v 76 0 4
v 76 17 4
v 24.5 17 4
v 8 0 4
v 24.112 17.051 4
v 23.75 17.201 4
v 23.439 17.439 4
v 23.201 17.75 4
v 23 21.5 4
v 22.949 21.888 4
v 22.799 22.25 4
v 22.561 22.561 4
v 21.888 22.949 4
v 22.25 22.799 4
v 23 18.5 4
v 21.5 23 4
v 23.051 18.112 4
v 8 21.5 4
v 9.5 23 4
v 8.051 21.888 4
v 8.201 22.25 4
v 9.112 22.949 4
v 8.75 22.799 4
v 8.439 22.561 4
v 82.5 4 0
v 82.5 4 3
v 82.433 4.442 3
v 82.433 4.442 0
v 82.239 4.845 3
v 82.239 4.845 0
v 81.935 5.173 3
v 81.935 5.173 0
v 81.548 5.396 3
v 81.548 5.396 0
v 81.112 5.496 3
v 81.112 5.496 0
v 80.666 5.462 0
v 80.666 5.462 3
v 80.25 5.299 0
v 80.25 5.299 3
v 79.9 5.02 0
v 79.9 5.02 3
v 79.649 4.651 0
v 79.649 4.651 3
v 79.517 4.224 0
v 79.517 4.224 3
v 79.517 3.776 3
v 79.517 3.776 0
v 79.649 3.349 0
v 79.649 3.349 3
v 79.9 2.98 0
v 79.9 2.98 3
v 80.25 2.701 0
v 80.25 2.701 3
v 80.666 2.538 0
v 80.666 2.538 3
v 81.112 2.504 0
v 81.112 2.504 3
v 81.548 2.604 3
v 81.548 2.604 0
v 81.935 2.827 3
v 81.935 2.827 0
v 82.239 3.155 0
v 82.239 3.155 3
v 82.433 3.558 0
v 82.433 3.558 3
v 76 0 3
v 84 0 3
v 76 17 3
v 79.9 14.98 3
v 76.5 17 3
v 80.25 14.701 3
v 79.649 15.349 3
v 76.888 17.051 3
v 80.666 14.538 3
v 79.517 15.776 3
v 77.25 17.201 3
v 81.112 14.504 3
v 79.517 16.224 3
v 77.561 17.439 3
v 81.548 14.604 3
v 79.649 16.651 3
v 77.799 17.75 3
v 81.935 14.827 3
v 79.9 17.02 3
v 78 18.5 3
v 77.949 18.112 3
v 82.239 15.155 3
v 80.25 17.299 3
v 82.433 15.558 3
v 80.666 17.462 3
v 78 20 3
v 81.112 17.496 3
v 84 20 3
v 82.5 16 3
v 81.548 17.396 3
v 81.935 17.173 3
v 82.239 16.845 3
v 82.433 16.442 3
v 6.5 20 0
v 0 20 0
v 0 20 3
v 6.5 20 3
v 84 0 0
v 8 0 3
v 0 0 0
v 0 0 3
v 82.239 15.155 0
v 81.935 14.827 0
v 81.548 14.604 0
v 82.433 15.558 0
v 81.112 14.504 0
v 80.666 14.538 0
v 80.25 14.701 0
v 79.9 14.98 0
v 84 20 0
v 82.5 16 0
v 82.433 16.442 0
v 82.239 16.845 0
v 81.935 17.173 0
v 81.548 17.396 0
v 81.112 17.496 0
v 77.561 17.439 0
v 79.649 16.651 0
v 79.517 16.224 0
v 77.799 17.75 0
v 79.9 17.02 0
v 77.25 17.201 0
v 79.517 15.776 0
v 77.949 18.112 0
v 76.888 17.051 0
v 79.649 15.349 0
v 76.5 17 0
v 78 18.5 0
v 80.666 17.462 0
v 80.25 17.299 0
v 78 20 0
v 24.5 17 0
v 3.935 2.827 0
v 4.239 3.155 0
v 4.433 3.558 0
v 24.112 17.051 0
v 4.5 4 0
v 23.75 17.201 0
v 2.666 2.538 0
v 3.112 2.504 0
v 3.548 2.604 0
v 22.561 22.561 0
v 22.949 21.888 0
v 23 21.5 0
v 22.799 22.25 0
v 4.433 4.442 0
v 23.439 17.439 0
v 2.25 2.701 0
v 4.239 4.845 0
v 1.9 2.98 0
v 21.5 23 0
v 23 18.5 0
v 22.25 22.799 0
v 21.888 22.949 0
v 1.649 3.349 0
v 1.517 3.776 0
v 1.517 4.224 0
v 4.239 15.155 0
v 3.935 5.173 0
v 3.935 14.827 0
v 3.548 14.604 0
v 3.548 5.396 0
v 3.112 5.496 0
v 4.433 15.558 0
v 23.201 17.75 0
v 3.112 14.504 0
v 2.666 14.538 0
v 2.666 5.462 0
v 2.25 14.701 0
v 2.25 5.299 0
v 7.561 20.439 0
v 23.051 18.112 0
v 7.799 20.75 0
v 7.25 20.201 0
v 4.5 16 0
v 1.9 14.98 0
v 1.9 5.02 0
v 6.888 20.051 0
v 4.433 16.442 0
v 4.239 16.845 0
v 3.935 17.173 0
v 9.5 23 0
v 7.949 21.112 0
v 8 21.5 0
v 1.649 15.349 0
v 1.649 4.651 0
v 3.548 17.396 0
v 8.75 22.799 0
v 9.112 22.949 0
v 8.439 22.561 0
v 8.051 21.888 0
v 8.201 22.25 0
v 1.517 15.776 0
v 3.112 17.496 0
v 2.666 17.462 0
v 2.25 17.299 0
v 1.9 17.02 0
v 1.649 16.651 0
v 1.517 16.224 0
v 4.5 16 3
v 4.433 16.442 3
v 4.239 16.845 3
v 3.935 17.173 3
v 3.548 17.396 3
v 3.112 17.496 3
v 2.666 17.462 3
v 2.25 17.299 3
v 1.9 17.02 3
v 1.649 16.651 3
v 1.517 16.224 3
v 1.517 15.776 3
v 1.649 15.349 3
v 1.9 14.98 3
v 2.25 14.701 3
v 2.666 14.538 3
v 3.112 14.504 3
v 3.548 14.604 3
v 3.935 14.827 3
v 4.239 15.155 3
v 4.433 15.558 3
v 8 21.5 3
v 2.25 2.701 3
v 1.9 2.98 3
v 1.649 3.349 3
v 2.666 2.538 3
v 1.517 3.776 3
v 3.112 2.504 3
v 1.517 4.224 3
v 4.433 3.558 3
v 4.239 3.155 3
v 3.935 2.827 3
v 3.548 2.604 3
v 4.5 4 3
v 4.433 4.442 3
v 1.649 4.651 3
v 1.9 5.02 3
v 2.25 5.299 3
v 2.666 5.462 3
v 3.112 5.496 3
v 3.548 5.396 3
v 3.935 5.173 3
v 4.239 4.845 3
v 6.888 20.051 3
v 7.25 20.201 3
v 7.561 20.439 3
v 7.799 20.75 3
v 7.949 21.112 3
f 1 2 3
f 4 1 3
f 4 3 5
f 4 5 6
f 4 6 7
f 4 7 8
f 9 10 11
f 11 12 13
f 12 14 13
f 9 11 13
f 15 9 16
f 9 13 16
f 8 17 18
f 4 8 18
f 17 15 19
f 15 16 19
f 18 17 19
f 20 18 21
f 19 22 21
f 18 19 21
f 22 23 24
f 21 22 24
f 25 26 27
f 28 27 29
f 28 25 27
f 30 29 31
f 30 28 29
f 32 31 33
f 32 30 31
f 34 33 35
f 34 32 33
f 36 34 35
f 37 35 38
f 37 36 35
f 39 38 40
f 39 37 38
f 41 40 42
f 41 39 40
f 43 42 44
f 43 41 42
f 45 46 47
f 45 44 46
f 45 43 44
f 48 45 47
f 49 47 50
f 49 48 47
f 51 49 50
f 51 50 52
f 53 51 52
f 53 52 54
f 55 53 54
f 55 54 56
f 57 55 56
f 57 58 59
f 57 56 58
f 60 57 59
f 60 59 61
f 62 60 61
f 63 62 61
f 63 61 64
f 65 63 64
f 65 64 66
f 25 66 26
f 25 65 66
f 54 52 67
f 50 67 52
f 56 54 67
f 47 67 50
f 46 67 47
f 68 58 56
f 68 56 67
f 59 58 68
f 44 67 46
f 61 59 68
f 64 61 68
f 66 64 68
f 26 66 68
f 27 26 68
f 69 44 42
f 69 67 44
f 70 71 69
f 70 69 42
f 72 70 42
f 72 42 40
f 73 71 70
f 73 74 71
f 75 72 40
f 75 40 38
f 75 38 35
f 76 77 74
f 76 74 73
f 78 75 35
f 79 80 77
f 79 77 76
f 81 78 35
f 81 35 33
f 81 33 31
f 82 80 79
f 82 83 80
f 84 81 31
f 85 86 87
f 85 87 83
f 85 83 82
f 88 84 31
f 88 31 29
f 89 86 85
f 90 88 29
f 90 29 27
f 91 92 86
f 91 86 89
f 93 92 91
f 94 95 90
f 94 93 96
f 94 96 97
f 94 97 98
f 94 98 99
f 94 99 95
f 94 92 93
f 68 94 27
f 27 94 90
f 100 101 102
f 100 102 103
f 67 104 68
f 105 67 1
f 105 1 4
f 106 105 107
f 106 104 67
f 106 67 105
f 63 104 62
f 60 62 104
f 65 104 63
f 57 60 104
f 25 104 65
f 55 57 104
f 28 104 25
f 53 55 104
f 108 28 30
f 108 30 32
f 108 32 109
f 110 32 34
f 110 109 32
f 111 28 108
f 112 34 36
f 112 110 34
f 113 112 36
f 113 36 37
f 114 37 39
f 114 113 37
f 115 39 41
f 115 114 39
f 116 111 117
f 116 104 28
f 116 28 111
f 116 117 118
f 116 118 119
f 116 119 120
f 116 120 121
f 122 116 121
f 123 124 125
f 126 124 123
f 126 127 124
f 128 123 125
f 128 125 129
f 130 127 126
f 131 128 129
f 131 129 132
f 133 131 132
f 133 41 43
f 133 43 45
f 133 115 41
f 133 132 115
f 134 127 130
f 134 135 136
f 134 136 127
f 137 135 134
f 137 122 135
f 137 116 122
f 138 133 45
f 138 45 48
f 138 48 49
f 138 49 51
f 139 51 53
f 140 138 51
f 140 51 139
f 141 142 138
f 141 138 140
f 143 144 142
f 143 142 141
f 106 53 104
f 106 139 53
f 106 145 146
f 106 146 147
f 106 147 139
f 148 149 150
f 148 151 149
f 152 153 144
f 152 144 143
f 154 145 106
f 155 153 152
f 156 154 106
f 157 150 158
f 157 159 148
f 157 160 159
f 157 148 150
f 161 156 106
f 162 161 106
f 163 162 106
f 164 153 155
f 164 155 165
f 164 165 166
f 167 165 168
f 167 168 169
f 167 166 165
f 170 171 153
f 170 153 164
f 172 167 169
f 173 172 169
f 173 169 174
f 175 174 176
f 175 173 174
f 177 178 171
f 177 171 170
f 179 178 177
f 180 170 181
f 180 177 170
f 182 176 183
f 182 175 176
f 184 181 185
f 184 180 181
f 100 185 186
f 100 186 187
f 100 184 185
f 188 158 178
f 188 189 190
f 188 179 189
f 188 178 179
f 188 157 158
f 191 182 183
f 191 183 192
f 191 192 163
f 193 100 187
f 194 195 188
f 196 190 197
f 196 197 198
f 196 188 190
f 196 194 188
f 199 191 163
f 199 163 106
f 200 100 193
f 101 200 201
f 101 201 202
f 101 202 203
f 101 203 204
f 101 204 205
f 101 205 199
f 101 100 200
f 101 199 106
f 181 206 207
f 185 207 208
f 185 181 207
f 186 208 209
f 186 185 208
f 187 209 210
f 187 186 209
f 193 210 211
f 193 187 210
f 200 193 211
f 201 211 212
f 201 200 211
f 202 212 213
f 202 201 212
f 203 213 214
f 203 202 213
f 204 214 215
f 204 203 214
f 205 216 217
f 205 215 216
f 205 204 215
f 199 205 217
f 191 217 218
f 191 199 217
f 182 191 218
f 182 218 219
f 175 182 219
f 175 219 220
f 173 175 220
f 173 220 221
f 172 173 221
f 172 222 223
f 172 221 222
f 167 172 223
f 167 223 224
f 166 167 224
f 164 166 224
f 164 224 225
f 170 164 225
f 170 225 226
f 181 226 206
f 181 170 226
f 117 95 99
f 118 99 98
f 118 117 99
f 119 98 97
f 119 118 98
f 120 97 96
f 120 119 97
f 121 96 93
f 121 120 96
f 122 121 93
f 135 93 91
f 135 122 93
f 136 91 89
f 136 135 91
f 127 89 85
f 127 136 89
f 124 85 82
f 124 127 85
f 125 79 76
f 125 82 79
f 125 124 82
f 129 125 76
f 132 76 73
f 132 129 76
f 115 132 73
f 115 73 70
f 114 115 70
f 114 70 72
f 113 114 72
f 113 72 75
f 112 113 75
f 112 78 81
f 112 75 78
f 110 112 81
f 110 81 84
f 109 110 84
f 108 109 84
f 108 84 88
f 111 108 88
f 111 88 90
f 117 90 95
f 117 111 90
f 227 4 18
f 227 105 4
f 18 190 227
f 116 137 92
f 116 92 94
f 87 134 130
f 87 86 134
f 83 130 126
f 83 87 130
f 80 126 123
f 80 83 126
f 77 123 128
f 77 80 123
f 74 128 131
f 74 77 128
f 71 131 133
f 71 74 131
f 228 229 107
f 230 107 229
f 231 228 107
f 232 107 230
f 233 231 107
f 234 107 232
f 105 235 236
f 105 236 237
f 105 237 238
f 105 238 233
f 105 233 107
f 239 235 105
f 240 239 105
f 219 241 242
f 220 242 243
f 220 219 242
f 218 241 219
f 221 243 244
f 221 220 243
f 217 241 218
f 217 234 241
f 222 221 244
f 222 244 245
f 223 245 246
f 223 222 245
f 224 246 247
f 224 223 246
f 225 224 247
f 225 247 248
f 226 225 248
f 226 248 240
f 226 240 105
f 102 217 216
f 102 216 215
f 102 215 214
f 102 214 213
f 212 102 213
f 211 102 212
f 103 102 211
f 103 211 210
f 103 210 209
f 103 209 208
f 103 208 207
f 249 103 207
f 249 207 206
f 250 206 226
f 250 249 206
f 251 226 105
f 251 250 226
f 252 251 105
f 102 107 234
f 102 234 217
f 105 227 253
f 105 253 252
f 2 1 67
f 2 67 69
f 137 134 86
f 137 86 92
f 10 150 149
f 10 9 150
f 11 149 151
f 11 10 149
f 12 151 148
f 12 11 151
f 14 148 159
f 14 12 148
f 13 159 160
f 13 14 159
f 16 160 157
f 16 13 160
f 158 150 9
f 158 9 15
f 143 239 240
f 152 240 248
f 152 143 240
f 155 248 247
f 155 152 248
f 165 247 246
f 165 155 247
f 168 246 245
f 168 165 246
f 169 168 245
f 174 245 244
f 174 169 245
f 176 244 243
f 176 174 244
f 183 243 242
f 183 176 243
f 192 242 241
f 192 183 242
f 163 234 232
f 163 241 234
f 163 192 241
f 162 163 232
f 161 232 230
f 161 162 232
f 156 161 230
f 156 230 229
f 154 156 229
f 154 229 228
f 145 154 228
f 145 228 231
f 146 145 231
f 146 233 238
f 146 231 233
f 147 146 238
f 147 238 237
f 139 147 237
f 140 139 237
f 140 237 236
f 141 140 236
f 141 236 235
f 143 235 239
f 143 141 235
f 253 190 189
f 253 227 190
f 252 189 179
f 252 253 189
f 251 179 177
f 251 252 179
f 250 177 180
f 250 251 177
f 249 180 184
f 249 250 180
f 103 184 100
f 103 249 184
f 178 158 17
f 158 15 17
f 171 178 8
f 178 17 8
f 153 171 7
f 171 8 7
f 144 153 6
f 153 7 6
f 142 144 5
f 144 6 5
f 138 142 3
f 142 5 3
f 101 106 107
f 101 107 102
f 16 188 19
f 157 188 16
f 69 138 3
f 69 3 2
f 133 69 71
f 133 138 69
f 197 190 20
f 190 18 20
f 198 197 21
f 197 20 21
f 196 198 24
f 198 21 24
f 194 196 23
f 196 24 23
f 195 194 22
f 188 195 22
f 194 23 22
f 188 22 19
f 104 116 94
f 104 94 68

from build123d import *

# Parameters (mm, degrees)
SKETCH1_R           = 1.5
BOSS_EXTRUDE1_DEPTH = 4
SKETCH2_W           = 8
SKETCH2_H           = 20
CUT_EXTRUDE1_DEPTH  = 1
FILLET1_R           = 1.5


with BuildPart() as part:
    # Sketch1 → Boss-Extrude1 (new body)
    with BuildSketch(Plane.XY):
        Polygon((23, 23), (23, 17), (78, 17), (78, 20), (84, 20), (84, 0), (0, 0), (0, 20), (8, 20), (8, 23), align=None)
        with Locations((3, 16)):
            Circle(SKETCH1_R, mode=Mode.SUBTRACT)
        with Locations((81, 16)):
            Circle(SKETCH1_R, mode=Mode.SUBTRACT)
        with Locations((3, 4)):
            Circle(SKETCH1_R, mode=Mode.SUBTRACT)
        with Locations((81, 4)):
            Circle(SKETCH1_R, mode=Mode.SUBTRACT)
    extrude(amount=BOSS_EXTRUDE1_DEPTH)

    # Sketch2 → Cut-Extrude1 (cut)
    with BuildSketch(Plane.XY.offset(4)):
        with Locations((4, 10)):
            Rectangle(SKETCH2_W, SKETCH2_H)
        with Locations((80, 10)):
            Rectangle(SKETCH2_W, SKETCH2_H)
    extrude(amount=-CUT_EXTRUDE1_DEPTH, mode=Mode.SUBTRACT)

    # Fillet1
    fillet1_edges = [part.edges().sort_by_distance(p)[0] for p in [
        (78, 17, 1.5),
        (23, 17, 2),
        (23, 23, 2),
        (8, 23, 2),
        (8, 20, 1.5),
    ]]
    fillet(fillet1_edges, radius=FILLET1_R - 0.0001)  # a hair under: the kernel refuses the full size


solid = part.part
